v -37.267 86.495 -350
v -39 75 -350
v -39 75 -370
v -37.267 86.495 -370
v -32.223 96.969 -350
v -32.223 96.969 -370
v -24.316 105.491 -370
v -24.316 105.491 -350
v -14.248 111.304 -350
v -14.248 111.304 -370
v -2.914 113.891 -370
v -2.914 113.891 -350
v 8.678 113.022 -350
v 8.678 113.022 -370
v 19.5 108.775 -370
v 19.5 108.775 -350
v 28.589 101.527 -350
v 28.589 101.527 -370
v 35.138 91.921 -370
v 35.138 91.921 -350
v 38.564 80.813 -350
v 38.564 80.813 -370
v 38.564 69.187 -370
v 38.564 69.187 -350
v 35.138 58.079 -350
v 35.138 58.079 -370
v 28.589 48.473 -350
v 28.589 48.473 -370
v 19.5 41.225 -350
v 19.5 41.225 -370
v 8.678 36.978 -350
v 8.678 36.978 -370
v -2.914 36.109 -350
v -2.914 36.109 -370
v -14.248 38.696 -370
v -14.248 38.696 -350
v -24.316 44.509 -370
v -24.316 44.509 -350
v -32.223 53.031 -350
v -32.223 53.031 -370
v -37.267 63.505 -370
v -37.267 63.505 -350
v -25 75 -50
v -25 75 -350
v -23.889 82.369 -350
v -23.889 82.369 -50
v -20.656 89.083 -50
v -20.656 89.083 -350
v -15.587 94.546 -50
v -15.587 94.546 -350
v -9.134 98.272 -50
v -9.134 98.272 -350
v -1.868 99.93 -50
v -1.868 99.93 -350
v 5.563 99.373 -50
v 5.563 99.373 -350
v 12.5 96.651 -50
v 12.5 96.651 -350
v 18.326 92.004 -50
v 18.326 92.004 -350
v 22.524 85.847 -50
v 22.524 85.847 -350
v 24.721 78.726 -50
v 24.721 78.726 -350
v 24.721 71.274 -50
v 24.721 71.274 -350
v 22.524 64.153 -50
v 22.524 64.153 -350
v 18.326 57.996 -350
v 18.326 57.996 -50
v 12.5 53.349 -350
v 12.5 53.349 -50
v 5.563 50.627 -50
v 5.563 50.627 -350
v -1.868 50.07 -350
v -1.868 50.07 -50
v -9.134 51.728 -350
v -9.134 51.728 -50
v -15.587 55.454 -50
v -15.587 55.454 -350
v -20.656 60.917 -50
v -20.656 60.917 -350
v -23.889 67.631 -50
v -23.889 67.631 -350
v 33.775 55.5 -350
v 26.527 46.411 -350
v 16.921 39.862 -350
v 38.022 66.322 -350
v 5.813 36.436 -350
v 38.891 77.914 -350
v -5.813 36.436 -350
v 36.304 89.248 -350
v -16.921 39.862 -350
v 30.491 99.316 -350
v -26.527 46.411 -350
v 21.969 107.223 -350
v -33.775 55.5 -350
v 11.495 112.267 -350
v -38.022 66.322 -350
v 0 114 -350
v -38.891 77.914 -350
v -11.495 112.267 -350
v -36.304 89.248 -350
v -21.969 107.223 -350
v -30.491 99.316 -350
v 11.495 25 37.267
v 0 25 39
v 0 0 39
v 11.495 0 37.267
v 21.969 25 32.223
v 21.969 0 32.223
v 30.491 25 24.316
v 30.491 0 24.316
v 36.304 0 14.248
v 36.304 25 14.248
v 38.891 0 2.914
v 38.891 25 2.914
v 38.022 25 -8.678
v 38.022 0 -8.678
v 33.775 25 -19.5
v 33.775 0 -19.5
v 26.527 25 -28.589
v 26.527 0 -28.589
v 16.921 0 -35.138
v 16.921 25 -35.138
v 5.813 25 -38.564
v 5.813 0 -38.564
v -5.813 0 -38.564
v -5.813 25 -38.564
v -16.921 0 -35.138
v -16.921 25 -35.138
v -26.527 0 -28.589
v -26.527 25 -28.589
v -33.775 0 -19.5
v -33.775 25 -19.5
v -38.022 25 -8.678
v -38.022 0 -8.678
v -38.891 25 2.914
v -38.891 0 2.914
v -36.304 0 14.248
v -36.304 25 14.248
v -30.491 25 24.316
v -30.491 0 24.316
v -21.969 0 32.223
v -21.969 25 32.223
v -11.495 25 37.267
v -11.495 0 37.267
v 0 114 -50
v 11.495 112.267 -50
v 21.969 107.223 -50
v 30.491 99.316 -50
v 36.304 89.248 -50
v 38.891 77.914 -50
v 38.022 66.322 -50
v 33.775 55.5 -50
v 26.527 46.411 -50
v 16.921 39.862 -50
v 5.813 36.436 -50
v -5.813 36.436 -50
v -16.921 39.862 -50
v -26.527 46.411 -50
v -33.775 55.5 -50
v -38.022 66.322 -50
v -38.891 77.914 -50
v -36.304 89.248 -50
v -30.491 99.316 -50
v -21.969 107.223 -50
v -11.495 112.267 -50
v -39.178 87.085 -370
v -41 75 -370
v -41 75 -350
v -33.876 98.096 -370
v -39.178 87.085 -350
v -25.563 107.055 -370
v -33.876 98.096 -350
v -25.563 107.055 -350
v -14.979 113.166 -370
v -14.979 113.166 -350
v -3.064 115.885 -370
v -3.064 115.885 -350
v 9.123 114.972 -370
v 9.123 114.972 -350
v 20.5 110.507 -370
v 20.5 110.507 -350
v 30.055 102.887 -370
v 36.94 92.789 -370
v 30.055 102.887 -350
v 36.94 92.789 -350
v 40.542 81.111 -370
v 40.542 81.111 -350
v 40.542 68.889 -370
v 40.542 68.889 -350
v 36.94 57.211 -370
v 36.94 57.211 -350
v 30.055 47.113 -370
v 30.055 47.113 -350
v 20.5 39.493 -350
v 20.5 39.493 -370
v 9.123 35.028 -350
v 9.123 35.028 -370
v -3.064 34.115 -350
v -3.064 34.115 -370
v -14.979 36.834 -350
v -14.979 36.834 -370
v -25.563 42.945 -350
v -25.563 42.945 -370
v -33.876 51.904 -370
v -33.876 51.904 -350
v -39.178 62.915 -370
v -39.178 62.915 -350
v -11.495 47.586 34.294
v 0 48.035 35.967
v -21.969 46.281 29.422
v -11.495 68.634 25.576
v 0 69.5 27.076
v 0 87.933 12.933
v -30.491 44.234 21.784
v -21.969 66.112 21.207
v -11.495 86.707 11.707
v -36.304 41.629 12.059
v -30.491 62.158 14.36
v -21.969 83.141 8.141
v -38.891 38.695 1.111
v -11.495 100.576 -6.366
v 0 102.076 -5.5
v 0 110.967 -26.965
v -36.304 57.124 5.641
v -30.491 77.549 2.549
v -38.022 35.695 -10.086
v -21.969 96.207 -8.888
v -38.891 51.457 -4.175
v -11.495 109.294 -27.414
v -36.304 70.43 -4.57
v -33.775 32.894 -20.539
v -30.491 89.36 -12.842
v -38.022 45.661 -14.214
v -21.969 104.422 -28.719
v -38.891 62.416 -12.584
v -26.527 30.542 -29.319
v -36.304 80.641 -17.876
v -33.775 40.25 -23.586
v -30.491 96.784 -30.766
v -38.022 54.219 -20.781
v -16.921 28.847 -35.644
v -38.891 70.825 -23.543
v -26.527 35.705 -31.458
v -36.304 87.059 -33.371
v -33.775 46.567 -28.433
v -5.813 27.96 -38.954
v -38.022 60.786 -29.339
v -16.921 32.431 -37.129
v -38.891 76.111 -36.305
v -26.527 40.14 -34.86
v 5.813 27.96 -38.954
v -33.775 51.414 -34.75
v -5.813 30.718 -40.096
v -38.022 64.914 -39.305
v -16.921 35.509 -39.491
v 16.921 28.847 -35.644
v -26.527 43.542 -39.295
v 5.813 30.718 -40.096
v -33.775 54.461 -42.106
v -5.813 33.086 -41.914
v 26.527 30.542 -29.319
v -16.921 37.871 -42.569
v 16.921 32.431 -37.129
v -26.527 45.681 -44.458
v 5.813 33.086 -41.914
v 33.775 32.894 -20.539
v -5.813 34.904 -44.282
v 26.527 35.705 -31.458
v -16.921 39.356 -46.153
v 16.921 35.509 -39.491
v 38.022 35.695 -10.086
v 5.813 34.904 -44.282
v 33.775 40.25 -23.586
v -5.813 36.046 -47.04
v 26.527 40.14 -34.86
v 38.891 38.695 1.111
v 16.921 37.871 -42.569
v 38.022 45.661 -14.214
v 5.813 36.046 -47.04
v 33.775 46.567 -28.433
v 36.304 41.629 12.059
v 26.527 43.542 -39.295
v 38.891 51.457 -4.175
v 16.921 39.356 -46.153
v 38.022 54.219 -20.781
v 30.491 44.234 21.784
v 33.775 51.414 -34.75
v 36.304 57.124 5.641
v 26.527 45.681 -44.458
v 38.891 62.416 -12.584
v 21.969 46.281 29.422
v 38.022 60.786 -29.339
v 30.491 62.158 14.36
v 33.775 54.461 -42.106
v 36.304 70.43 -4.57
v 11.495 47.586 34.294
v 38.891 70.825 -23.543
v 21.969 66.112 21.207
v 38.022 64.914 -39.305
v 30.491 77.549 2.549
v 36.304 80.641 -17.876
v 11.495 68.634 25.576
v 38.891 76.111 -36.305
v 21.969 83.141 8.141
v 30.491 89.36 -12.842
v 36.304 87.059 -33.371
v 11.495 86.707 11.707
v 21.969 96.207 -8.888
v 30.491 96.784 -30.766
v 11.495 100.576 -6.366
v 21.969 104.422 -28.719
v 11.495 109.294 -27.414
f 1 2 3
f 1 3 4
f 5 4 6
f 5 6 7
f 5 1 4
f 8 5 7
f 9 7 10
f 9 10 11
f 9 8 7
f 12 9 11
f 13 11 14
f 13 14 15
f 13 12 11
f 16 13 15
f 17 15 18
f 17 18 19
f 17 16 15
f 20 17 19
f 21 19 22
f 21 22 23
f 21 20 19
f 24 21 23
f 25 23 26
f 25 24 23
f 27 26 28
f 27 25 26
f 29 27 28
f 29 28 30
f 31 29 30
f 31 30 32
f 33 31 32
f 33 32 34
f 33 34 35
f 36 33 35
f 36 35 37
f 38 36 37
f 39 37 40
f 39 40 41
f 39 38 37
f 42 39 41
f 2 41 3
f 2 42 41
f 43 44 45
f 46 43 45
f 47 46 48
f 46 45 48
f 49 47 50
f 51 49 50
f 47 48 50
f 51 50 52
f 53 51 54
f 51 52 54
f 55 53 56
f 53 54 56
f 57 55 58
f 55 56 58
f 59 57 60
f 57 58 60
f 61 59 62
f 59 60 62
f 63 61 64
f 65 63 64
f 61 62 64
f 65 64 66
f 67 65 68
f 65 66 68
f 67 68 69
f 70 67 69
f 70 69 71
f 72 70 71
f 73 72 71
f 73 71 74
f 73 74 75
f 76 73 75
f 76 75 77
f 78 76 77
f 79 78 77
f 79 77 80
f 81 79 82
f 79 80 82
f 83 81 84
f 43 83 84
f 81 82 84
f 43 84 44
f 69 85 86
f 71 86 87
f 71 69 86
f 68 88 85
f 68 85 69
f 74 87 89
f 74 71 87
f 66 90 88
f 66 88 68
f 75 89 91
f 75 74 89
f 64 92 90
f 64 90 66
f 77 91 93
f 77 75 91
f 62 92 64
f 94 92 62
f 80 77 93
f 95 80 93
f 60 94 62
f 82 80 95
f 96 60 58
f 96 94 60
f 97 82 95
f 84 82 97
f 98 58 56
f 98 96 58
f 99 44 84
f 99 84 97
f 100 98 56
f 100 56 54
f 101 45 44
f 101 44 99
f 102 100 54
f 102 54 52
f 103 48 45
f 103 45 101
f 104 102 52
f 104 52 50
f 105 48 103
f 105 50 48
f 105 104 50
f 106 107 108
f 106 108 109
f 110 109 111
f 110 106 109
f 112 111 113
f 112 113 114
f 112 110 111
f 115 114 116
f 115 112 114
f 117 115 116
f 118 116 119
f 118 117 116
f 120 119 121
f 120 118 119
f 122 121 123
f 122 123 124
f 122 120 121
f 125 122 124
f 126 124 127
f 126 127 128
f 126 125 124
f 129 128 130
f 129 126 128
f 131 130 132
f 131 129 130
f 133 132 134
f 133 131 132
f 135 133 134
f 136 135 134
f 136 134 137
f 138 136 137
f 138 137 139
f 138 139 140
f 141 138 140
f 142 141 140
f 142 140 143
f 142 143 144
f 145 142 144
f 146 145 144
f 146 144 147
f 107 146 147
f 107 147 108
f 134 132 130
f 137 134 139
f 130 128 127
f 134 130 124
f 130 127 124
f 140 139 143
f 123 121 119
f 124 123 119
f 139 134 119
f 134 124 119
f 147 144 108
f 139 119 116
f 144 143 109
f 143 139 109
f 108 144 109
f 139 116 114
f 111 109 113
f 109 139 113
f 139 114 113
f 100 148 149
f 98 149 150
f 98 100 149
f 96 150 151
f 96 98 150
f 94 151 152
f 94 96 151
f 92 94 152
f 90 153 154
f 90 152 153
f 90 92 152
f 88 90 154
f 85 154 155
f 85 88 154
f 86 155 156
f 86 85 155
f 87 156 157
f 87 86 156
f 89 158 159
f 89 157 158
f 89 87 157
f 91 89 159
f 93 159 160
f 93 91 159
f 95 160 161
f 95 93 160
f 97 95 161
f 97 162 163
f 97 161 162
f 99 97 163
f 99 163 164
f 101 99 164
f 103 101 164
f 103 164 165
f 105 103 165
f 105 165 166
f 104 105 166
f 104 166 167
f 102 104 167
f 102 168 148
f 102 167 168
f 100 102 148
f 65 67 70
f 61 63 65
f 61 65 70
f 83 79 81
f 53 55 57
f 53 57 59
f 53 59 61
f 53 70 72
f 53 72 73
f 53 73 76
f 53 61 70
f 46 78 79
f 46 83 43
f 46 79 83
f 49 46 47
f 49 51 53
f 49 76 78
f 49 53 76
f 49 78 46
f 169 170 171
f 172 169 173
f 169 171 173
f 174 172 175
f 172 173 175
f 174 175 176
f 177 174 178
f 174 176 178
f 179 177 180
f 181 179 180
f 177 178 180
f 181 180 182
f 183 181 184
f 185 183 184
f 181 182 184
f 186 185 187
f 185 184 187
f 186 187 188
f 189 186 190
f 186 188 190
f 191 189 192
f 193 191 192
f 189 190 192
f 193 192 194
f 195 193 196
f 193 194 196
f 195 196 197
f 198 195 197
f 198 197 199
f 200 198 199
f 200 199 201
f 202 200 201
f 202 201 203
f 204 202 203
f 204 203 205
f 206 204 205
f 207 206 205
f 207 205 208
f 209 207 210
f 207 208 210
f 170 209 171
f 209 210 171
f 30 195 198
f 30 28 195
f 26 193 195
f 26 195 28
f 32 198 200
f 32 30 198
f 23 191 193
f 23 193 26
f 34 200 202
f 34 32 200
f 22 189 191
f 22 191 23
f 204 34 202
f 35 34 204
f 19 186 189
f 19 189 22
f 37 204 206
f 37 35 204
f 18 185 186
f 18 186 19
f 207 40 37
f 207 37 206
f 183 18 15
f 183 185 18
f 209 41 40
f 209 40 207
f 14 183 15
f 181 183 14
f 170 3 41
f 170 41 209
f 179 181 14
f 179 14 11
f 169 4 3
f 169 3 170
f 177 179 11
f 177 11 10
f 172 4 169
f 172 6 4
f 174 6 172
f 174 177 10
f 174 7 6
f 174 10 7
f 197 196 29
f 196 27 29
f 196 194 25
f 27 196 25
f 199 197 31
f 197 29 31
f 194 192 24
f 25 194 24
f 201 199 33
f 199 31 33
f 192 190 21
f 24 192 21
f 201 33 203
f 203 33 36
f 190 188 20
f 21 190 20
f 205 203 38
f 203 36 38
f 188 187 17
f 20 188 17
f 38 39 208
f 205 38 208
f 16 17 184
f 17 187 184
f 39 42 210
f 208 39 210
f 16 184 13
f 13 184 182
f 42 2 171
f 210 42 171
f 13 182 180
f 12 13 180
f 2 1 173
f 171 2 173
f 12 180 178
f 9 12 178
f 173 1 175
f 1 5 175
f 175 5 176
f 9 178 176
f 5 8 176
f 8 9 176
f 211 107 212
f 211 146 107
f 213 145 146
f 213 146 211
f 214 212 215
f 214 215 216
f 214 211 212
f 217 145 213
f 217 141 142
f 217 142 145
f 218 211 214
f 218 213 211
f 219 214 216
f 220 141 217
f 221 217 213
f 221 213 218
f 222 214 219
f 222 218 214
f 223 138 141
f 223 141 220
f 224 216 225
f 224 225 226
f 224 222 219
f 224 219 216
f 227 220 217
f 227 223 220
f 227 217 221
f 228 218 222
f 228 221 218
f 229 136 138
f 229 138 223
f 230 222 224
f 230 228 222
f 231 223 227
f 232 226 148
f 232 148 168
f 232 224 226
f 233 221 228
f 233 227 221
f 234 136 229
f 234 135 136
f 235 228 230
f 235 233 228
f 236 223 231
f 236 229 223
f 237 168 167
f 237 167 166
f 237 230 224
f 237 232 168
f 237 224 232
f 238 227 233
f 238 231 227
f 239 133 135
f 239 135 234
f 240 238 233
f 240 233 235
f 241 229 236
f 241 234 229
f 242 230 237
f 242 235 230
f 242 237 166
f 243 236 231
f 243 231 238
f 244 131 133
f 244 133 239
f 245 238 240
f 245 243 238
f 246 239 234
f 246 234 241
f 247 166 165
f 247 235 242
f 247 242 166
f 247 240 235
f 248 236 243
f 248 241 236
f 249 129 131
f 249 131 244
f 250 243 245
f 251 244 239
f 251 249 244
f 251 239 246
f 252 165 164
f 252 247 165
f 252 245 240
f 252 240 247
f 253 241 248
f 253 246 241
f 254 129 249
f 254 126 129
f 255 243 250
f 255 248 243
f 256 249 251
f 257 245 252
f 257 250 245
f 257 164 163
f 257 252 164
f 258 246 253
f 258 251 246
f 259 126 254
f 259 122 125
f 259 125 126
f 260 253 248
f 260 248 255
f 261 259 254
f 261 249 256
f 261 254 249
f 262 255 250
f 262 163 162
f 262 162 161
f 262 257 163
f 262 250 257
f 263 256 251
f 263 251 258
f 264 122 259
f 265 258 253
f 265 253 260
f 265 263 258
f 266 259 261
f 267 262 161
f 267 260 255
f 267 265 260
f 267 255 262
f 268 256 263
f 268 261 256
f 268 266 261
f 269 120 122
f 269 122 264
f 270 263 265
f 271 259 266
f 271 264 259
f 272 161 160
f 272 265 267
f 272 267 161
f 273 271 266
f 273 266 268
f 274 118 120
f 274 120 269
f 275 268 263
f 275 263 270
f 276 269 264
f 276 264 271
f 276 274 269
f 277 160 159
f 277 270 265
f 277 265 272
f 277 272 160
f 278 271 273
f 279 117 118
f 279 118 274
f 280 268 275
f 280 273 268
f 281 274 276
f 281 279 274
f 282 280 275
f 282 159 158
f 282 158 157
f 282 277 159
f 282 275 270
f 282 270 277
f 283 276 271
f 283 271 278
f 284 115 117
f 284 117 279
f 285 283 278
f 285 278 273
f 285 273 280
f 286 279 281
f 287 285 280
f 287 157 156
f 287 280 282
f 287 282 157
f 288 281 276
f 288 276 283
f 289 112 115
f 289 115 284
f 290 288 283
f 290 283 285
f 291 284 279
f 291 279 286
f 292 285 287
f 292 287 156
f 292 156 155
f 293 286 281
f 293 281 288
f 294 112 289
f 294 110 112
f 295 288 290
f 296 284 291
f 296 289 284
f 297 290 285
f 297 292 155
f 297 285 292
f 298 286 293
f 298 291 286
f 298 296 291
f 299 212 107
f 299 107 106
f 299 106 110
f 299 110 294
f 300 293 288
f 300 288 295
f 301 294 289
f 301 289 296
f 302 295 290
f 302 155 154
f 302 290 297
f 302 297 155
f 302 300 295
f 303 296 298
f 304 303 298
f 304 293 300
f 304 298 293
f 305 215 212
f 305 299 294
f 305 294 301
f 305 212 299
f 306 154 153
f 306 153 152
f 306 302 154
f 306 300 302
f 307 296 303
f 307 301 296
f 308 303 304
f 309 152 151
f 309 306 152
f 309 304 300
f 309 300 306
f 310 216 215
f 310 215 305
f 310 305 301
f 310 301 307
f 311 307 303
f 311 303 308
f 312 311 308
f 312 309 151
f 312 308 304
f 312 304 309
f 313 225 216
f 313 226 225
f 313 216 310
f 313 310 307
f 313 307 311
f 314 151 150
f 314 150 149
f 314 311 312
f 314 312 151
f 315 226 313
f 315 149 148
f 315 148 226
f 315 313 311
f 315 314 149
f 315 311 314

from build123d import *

# Parameters (mm, degrees)
SWEEP2_PROFILE_R    = 39
SKETCH8_R           = 41
SKETCH8_R_2         = 39
BOSS_EXTRUDE1_DEPTH = 20
SKETCH11_R          = 25
CUT_EXTRUDE1_DEPTH  = 300


with BuildPart() as part:
    # Sweep2: sweep along a path in Sketch2
    with BuildLine(Plane(origin=(0, 0, 0), x_dir=(0, 0, -1), z_dir=(1, 0, 0))) as sweep2_path:
        Line((0, 0), (0, 25))
        ThreePointArc((0, 25), (14.644660941, 60.355339059), (50, 75))
        Line((50, 75), (350, 75))
    # Sweep2 profile (on start of the path) → Sweep2 (sweep)
    with BuildSketch(Plane.ZX):
        Circle(SWEEP2_PROFILE_R)
    sweep(path=sweep2_path.line)

    # Sketch11 → Cut-Extrude1 (cut)
    with BuildSketch(Plane(origin=(0, 0, -350), x_dir=(-1, 0, 0), z_dir=(0, 0, -1))):
        with Locations((0, 75)):
            Circle(SKETCH11_R)
    extrude(amount=-CUT_EXTRUDE1_DEPTH, mode=Mode.SUBTRACT)


with BuildPart() as body_2:
    # Sketch8 → Boss-Extrude1 (new body)
    with BuildSketch(Plane(origin=(0, 0, -350), x_dir=(-1, 0, 0), z_dir=(0, 0, -1))):
        with Locations((0, 75)):
            Circle(SKETCH8_R)
        with Locations((0, 75)):
            Circle(SKETCH8_R_2, mode=Mode.SUBTRACT)
    extrude(amount=BOSS_EXTRUDE1_DEPTH)


solid = Compound([part.part, body_2.part])
